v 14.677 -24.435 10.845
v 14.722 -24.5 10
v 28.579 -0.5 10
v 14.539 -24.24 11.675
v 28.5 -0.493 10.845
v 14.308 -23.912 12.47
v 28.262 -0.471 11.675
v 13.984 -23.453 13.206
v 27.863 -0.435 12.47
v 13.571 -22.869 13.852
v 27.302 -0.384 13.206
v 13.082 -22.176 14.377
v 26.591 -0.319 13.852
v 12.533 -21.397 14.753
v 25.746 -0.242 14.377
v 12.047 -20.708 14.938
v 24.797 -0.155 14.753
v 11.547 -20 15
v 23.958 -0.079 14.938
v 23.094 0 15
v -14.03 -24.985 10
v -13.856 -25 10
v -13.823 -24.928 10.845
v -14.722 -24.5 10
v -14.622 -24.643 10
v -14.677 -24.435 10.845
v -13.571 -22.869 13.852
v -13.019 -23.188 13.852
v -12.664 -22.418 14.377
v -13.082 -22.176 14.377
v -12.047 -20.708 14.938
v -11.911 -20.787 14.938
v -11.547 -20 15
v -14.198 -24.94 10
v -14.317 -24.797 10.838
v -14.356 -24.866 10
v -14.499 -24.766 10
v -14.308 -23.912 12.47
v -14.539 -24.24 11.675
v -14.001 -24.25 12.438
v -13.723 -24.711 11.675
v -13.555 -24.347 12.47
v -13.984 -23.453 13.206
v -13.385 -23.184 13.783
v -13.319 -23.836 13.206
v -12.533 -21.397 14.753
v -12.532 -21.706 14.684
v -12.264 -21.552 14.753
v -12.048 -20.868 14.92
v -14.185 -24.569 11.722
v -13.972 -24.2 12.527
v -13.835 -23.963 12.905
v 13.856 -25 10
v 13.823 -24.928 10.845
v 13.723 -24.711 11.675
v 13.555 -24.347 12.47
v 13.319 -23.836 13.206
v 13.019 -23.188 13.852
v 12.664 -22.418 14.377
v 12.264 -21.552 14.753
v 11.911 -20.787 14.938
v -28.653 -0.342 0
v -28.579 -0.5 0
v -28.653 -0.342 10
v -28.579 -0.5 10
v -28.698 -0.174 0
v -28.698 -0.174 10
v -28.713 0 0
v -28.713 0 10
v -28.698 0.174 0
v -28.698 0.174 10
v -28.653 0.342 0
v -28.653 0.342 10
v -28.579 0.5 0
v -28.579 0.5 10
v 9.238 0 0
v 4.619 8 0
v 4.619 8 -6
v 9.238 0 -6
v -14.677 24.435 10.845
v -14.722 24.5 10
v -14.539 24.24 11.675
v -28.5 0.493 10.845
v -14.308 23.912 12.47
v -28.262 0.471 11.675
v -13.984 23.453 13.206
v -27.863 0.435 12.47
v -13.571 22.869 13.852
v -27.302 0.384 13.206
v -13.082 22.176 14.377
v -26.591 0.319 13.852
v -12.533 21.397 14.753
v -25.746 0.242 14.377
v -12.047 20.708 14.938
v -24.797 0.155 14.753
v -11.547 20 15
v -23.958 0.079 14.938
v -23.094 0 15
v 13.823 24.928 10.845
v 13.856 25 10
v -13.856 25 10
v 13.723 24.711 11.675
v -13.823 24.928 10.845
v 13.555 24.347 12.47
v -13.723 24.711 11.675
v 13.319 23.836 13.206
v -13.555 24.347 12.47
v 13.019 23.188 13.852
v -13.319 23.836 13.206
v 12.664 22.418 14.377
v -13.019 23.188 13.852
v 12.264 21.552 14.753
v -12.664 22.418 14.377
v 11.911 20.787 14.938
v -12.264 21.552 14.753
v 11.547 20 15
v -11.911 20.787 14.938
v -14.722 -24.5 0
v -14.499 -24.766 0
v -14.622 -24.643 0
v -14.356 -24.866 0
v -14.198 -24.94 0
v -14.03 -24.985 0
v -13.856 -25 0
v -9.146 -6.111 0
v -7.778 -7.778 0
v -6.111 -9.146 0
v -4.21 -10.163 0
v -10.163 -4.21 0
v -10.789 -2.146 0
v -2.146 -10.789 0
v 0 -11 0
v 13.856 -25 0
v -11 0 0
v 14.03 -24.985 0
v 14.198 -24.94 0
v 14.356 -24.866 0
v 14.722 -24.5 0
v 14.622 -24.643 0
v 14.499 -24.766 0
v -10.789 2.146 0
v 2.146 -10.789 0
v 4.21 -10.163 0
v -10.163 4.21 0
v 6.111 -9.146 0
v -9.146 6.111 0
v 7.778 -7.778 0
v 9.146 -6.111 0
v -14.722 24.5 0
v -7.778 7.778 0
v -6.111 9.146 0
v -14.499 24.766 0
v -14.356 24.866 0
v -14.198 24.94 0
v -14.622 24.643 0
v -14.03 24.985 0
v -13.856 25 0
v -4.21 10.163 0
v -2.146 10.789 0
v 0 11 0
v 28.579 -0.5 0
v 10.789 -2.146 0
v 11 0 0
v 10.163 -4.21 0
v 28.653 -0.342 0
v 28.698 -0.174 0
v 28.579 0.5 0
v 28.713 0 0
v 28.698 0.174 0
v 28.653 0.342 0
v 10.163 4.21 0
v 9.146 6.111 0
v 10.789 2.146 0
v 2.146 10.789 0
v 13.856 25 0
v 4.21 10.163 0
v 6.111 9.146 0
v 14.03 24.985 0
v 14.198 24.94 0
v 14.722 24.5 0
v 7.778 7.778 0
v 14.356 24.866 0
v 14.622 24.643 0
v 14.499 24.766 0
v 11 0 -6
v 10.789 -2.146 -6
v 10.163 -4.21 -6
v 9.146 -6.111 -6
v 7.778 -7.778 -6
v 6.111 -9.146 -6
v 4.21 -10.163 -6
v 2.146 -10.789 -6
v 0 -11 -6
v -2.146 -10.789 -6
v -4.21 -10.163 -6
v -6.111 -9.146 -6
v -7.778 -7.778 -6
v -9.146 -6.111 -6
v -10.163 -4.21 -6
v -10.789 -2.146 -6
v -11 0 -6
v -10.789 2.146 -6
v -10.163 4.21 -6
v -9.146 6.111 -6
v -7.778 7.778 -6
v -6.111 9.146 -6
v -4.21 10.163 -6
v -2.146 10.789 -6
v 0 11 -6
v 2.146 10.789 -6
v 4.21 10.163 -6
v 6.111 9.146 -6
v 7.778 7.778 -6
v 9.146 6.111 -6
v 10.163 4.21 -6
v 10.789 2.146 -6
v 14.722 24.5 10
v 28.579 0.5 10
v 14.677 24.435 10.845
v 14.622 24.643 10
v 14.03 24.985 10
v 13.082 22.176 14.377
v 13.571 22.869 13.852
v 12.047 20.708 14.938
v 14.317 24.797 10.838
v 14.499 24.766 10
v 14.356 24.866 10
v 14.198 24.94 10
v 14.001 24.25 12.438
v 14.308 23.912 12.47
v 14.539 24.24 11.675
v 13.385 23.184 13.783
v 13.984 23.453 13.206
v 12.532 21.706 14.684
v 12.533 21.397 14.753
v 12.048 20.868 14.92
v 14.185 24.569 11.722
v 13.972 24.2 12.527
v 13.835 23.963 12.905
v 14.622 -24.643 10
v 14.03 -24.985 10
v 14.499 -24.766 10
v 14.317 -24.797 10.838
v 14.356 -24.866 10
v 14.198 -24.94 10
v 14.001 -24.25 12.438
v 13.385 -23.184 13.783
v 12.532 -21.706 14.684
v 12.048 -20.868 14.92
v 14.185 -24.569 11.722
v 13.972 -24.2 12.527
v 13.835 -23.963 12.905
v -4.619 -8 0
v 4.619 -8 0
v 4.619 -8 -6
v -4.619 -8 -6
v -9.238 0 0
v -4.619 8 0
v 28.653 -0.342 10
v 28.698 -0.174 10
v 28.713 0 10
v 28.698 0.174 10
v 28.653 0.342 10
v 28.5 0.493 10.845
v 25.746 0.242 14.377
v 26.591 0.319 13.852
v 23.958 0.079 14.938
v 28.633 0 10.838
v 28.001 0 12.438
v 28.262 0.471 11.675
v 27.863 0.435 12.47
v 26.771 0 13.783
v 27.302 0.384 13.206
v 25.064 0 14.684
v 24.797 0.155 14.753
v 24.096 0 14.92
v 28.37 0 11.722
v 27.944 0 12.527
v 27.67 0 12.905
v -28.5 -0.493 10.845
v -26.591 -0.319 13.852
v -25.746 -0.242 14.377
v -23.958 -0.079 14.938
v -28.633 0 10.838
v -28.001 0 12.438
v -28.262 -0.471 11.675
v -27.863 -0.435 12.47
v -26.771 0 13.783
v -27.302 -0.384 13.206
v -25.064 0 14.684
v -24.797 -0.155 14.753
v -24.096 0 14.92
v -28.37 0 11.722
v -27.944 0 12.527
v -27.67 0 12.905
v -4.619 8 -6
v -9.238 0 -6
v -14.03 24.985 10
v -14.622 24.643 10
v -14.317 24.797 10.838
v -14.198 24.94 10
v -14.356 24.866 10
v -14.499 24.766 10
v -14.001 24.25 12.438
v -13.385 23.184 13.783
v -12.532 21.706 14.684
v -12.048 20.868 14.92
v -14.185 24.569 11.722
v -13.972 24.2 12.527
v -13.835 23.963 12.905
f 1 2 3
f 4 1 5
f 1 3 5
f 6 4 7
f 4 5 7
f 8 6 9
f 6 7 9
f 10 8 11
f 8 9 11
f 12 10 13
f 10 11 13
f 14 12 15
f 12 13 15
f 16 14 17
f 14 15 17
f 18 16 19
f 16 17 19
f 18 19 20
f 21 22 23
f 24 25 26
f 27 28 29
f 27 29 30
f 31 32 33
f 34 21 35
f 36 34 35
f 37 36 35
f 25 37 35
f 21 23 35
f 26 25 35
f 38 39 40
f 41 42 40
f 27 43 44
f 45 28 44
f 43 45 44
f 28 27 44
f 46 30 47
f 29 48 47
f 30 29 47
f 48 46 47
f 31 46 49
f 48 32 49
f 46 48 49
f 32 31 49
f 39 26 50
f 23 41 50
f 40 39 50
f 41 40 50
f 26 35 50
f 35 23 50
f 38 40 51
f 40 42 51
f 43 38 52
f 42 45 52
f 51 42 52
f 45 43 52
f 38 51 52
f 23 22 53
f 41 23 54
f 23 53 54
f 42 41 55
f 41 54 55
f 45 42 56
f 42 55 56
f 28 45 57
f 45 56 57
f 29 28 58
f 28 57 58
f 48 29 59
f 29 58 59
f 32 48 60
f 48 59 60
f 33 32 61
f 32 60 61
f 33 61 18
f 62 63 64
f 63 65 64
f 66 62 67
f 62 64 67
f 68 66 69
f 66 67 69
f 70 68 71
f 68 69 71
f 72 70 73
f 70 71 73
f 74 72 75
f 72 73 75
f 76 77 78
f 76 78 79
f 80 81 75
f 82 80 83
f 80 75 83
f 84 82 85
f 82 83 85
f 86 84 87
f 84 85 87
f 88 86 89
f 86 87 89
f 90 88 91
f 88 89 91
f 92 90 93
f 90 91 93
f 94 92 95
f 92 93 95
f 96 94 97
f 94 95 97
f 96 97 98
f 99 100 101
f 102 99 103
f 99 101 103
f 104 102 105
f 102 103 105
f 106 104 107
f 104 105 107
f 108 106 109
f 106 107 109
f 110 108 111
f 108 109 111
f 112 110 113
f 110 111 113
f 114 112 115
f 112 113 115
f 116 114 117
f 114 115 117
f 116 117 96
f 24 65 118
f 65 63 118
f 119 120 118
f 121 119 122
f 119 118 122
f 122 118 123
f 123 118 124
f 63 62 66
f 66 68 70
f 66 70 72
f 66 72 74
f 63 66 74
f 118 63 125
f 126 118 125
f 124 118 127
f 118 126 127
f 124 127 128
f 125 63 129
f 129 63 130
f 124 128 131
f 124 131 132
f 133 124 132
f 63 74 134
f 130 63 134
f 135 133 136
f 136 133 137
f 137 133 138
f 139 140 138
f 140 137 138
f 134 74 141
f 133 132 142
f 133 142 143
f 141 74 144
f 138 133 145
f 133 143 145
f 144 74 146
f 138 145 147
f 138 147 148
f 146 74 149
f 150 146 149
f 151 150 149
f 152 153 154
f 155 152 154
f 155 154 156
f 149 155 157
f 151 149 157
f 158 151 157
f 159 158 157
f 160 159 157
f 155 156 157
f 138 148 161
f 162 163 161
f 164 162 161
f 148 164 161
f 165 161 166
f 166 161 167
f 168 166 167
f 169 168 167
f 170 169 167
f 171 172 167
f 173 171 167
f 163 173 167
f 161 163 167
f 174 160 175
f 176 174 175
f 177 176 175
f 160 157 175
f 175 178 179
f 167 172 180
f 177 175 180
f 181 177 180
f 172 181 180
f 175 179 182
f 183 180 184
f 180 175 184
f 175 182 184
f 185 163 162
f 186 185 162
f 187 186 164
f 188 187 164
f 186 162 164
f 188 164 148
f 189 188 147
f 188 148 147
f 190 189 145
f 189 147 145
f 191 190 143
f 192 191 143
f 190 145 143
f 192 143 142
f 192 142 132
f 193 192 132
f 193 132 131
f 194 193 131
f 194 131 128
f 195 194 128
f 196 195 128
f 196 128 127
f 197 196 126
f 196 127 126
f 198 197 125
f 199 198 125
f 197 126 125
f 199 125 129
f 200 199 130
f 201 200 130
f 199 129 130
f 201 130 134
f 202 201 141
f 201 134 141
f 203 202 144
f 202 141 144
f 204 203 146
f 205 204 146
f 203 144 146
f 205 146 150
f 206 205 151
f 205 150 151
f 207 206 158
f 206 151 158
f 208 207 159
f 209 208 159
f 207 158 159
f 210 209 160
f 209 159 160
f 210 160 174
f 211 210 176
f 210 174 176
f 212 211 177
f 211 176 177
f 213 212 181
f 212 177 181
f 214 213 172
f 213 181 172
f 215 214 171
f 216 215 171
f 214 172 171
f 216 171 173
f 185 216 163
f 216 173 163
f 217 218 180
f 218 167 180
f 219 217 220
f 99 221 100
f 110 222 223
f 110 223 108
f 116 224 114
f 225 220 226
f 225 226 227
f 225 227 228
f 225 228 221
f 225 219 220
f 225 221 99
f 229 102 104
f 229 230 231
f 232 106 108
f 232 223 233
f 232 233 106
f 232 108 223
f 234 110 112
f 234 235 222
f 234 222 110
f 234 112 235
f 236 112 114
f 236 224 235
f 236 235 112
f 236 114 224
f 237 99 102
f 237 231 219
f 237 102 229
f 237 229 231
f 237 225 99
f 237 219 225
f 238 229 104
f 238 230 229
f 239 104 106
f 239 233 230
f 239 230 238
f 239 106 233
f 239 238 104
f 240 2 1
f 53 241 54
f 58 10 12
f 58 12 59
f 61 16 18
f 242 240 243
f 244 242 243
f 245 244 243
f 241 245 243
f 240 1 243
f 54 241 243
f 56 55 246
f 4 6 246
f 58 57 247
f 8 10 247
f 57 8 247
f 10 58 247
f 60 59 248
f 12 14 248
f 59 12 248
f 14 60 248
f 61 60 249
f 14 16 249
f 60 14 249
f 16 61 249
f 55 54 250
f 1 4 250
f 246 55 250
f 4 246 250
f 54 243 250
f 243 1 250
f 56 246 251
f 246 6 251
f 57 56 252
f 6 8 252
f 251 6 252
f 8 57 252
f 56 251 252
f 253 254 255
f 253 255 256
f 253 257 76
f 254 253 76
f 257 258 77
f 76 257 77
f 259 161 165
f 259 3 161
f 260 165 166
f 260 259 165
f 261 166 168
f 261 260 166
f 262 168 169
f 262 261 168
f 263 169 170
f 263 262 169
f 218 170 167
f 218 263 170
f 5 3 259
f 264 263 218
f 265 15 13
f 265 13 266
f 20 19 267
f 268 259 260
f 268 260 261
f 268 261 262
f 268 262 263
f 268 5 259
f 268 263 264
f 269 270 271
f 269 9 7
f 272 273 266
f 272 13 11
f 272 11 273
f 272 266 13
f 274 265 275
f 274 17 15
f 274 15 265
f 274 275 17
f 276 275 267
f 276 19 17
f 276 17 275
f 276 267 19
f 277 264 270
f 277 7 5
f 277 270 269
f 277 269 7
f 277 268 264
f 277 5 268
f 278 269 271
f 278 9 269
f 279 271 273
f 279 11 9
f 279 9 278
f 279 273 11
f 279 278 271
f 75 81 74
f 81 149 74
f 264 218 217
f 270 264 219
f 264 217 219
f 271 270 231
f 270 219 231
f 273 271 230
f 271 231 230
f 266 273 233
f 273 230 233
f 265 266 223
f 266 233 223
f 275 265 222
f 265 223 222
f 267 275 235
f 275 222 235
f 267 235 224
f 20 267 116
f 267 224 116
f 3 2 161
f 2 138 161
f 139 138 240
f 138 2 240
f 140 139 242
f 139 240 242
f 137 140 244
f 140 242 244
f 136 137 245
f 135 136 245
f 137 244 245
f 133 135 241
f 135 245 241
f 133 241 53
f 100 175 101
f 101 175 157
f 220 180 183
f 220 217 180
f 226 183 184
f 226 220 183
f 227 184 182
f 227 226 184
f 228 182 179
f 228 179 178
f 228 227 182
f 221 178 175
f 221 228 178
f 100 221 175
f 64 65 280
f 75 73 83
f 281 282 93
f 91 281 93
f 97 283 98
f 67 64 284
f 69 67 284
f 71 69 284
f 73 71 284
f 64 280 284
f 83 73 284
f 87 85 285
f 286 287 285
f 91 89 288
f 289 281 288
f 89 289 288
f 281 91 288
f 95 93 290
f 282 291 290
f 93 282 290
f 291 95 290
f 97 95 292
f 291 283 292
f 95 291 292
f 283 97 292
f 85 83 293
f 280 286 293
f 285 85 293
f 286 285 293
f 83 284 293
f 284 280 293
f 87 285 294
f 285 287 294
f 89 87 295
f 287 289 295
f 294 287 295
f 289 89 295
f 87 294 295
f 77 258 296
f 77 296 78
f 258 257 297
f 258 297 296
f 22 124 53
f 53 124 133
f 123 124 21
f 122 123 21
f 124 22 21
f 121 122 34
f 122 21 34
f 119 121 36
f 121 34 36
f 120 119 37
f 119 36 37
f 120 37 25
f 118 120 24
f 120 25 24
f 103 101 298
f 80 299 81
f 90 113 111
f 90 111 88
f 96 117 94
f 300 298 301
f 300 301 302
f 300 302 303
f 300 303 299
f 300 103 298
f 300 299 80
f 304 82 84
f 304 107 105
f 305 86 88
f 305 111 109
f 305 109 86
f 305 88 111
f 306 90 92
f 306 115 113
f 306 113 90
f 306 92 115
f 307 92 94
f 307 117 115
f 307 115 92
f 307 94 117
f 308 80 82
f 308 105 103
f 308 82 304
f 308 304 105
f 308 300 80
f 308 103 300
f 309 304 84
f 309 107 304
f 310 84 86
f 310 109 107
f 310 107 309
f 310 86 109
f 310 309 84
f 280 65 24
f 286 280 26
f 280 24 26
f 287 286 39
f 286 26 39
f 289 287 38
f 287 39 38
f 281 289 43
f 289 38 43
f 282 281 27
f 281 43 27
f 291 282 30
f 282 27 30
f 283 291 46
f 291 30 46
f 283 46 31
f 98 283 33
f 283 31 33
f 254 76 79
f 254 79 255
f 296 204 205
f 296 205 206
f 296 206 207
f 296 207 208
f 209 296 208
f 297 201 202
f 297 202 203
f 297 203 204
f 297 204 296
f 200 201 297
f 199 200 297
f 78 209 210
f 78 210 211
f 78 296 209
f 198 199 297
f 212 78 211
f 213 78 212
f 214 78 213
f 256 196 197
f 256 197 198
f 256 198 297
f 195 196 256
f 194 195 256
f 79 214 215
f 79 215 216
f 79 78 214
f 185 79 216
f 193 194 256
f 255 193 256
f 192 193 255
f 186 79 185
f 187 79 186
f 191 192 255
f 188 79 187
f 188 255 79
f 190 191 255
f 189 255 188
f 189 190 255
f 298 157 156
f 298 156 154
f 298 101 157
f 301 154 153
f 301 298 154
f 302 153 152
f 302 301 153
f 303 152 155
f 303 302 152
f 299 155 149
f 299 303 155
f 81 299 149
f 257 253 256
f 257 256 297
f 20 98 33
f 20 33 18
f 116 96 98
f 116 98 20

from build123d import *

# Parameters (mm, degrees)
DODANIE_WYCI_GNI_CIE1_DEPTH = 15
ZAOKR_GLENIE1_R             = 5
ZAOKR_GLENIE2_R             = 1
SZKIC3_R                    = 11
DODANIE_WYCI_GNI_CIE2_DEPTH = 6


with BuildPart() as part:
    # Szkic1 → Dodanie-wyciągnięcie1 (new body)
    with BuildSketch(Plane.XY):
        Polygon((14.43375673, -25), (28.867513459, 0), (14.43375673, 25), (-14.43375673, 25), (-28.867513459, 0), (-14.43375673, -25), align=None)
    extrude(amount=DODANIE_WYCI_GNI_CIE1_DEPTH)

    # Zaokrąglenie1
    zaokr_glenie1_edges = [part.edges().sort_by_distance(p)[0] for p in [
        (0, 25, 15),
        (-21.650635095, 12.5, 15),
        (-21.650635095, -12.5, 15),
        (0, -25, 15),
        (21.650635095, -12.5, 15),
        (21.650635095, 12.5, 15),
    ]]
    fillet(zaokr_glenie1_edges, radius=ZAOKR_GLENIE1_R)

    # Zaokrąglenie2
    zaokr_glenie2_edges = [part.edges().sort_by_distance(p)[0] for p in [
        (-13.514121691, 23.407145389, 13.65942076),
        (-27.02824329, 0, 13.659420835),
        (-13.514121691, -23.407145389, 13.65942076),
        (13.514121691, -23.407145389, 13.65942076),
        (27.028243383, 0, 13.65942076),
        (13.514121691, 23.407145389, 13.65942076),
        (-14.43375673, 25, 5),
        (-28.867513459, 0, 5),
        (-14.43375673, -25, 5),
        (14.43375673, -25, 5),
        (28.867513459, 0, 5),
        (14.43375673, 25, 5),
    ]]
    fillet(zaokr_glenie2_edges, radius=ZAOKR_GLENIE2_R)

    # Szkic3 → Dodanie-wyciągnięcie2 (add)
    with BuildSketch(Plane(origin=(0, 0, 0), x_dir=(-1, 0, 0), z_dir=(0, 0, -1))):
        Circle(SZKIC3_R)
        Polygon((4.618802154, -8), (9.237604307, 0), (4.618802154, 8), (-4.618802154, 8), (-9.237604307, 0), (-4.618802154, -8), align=None, mode=Mode.SUBTRACT)
    extrude(amount=DODANIE_WYCI_GNI_CIE2_DEPTH)


solid = part.part
